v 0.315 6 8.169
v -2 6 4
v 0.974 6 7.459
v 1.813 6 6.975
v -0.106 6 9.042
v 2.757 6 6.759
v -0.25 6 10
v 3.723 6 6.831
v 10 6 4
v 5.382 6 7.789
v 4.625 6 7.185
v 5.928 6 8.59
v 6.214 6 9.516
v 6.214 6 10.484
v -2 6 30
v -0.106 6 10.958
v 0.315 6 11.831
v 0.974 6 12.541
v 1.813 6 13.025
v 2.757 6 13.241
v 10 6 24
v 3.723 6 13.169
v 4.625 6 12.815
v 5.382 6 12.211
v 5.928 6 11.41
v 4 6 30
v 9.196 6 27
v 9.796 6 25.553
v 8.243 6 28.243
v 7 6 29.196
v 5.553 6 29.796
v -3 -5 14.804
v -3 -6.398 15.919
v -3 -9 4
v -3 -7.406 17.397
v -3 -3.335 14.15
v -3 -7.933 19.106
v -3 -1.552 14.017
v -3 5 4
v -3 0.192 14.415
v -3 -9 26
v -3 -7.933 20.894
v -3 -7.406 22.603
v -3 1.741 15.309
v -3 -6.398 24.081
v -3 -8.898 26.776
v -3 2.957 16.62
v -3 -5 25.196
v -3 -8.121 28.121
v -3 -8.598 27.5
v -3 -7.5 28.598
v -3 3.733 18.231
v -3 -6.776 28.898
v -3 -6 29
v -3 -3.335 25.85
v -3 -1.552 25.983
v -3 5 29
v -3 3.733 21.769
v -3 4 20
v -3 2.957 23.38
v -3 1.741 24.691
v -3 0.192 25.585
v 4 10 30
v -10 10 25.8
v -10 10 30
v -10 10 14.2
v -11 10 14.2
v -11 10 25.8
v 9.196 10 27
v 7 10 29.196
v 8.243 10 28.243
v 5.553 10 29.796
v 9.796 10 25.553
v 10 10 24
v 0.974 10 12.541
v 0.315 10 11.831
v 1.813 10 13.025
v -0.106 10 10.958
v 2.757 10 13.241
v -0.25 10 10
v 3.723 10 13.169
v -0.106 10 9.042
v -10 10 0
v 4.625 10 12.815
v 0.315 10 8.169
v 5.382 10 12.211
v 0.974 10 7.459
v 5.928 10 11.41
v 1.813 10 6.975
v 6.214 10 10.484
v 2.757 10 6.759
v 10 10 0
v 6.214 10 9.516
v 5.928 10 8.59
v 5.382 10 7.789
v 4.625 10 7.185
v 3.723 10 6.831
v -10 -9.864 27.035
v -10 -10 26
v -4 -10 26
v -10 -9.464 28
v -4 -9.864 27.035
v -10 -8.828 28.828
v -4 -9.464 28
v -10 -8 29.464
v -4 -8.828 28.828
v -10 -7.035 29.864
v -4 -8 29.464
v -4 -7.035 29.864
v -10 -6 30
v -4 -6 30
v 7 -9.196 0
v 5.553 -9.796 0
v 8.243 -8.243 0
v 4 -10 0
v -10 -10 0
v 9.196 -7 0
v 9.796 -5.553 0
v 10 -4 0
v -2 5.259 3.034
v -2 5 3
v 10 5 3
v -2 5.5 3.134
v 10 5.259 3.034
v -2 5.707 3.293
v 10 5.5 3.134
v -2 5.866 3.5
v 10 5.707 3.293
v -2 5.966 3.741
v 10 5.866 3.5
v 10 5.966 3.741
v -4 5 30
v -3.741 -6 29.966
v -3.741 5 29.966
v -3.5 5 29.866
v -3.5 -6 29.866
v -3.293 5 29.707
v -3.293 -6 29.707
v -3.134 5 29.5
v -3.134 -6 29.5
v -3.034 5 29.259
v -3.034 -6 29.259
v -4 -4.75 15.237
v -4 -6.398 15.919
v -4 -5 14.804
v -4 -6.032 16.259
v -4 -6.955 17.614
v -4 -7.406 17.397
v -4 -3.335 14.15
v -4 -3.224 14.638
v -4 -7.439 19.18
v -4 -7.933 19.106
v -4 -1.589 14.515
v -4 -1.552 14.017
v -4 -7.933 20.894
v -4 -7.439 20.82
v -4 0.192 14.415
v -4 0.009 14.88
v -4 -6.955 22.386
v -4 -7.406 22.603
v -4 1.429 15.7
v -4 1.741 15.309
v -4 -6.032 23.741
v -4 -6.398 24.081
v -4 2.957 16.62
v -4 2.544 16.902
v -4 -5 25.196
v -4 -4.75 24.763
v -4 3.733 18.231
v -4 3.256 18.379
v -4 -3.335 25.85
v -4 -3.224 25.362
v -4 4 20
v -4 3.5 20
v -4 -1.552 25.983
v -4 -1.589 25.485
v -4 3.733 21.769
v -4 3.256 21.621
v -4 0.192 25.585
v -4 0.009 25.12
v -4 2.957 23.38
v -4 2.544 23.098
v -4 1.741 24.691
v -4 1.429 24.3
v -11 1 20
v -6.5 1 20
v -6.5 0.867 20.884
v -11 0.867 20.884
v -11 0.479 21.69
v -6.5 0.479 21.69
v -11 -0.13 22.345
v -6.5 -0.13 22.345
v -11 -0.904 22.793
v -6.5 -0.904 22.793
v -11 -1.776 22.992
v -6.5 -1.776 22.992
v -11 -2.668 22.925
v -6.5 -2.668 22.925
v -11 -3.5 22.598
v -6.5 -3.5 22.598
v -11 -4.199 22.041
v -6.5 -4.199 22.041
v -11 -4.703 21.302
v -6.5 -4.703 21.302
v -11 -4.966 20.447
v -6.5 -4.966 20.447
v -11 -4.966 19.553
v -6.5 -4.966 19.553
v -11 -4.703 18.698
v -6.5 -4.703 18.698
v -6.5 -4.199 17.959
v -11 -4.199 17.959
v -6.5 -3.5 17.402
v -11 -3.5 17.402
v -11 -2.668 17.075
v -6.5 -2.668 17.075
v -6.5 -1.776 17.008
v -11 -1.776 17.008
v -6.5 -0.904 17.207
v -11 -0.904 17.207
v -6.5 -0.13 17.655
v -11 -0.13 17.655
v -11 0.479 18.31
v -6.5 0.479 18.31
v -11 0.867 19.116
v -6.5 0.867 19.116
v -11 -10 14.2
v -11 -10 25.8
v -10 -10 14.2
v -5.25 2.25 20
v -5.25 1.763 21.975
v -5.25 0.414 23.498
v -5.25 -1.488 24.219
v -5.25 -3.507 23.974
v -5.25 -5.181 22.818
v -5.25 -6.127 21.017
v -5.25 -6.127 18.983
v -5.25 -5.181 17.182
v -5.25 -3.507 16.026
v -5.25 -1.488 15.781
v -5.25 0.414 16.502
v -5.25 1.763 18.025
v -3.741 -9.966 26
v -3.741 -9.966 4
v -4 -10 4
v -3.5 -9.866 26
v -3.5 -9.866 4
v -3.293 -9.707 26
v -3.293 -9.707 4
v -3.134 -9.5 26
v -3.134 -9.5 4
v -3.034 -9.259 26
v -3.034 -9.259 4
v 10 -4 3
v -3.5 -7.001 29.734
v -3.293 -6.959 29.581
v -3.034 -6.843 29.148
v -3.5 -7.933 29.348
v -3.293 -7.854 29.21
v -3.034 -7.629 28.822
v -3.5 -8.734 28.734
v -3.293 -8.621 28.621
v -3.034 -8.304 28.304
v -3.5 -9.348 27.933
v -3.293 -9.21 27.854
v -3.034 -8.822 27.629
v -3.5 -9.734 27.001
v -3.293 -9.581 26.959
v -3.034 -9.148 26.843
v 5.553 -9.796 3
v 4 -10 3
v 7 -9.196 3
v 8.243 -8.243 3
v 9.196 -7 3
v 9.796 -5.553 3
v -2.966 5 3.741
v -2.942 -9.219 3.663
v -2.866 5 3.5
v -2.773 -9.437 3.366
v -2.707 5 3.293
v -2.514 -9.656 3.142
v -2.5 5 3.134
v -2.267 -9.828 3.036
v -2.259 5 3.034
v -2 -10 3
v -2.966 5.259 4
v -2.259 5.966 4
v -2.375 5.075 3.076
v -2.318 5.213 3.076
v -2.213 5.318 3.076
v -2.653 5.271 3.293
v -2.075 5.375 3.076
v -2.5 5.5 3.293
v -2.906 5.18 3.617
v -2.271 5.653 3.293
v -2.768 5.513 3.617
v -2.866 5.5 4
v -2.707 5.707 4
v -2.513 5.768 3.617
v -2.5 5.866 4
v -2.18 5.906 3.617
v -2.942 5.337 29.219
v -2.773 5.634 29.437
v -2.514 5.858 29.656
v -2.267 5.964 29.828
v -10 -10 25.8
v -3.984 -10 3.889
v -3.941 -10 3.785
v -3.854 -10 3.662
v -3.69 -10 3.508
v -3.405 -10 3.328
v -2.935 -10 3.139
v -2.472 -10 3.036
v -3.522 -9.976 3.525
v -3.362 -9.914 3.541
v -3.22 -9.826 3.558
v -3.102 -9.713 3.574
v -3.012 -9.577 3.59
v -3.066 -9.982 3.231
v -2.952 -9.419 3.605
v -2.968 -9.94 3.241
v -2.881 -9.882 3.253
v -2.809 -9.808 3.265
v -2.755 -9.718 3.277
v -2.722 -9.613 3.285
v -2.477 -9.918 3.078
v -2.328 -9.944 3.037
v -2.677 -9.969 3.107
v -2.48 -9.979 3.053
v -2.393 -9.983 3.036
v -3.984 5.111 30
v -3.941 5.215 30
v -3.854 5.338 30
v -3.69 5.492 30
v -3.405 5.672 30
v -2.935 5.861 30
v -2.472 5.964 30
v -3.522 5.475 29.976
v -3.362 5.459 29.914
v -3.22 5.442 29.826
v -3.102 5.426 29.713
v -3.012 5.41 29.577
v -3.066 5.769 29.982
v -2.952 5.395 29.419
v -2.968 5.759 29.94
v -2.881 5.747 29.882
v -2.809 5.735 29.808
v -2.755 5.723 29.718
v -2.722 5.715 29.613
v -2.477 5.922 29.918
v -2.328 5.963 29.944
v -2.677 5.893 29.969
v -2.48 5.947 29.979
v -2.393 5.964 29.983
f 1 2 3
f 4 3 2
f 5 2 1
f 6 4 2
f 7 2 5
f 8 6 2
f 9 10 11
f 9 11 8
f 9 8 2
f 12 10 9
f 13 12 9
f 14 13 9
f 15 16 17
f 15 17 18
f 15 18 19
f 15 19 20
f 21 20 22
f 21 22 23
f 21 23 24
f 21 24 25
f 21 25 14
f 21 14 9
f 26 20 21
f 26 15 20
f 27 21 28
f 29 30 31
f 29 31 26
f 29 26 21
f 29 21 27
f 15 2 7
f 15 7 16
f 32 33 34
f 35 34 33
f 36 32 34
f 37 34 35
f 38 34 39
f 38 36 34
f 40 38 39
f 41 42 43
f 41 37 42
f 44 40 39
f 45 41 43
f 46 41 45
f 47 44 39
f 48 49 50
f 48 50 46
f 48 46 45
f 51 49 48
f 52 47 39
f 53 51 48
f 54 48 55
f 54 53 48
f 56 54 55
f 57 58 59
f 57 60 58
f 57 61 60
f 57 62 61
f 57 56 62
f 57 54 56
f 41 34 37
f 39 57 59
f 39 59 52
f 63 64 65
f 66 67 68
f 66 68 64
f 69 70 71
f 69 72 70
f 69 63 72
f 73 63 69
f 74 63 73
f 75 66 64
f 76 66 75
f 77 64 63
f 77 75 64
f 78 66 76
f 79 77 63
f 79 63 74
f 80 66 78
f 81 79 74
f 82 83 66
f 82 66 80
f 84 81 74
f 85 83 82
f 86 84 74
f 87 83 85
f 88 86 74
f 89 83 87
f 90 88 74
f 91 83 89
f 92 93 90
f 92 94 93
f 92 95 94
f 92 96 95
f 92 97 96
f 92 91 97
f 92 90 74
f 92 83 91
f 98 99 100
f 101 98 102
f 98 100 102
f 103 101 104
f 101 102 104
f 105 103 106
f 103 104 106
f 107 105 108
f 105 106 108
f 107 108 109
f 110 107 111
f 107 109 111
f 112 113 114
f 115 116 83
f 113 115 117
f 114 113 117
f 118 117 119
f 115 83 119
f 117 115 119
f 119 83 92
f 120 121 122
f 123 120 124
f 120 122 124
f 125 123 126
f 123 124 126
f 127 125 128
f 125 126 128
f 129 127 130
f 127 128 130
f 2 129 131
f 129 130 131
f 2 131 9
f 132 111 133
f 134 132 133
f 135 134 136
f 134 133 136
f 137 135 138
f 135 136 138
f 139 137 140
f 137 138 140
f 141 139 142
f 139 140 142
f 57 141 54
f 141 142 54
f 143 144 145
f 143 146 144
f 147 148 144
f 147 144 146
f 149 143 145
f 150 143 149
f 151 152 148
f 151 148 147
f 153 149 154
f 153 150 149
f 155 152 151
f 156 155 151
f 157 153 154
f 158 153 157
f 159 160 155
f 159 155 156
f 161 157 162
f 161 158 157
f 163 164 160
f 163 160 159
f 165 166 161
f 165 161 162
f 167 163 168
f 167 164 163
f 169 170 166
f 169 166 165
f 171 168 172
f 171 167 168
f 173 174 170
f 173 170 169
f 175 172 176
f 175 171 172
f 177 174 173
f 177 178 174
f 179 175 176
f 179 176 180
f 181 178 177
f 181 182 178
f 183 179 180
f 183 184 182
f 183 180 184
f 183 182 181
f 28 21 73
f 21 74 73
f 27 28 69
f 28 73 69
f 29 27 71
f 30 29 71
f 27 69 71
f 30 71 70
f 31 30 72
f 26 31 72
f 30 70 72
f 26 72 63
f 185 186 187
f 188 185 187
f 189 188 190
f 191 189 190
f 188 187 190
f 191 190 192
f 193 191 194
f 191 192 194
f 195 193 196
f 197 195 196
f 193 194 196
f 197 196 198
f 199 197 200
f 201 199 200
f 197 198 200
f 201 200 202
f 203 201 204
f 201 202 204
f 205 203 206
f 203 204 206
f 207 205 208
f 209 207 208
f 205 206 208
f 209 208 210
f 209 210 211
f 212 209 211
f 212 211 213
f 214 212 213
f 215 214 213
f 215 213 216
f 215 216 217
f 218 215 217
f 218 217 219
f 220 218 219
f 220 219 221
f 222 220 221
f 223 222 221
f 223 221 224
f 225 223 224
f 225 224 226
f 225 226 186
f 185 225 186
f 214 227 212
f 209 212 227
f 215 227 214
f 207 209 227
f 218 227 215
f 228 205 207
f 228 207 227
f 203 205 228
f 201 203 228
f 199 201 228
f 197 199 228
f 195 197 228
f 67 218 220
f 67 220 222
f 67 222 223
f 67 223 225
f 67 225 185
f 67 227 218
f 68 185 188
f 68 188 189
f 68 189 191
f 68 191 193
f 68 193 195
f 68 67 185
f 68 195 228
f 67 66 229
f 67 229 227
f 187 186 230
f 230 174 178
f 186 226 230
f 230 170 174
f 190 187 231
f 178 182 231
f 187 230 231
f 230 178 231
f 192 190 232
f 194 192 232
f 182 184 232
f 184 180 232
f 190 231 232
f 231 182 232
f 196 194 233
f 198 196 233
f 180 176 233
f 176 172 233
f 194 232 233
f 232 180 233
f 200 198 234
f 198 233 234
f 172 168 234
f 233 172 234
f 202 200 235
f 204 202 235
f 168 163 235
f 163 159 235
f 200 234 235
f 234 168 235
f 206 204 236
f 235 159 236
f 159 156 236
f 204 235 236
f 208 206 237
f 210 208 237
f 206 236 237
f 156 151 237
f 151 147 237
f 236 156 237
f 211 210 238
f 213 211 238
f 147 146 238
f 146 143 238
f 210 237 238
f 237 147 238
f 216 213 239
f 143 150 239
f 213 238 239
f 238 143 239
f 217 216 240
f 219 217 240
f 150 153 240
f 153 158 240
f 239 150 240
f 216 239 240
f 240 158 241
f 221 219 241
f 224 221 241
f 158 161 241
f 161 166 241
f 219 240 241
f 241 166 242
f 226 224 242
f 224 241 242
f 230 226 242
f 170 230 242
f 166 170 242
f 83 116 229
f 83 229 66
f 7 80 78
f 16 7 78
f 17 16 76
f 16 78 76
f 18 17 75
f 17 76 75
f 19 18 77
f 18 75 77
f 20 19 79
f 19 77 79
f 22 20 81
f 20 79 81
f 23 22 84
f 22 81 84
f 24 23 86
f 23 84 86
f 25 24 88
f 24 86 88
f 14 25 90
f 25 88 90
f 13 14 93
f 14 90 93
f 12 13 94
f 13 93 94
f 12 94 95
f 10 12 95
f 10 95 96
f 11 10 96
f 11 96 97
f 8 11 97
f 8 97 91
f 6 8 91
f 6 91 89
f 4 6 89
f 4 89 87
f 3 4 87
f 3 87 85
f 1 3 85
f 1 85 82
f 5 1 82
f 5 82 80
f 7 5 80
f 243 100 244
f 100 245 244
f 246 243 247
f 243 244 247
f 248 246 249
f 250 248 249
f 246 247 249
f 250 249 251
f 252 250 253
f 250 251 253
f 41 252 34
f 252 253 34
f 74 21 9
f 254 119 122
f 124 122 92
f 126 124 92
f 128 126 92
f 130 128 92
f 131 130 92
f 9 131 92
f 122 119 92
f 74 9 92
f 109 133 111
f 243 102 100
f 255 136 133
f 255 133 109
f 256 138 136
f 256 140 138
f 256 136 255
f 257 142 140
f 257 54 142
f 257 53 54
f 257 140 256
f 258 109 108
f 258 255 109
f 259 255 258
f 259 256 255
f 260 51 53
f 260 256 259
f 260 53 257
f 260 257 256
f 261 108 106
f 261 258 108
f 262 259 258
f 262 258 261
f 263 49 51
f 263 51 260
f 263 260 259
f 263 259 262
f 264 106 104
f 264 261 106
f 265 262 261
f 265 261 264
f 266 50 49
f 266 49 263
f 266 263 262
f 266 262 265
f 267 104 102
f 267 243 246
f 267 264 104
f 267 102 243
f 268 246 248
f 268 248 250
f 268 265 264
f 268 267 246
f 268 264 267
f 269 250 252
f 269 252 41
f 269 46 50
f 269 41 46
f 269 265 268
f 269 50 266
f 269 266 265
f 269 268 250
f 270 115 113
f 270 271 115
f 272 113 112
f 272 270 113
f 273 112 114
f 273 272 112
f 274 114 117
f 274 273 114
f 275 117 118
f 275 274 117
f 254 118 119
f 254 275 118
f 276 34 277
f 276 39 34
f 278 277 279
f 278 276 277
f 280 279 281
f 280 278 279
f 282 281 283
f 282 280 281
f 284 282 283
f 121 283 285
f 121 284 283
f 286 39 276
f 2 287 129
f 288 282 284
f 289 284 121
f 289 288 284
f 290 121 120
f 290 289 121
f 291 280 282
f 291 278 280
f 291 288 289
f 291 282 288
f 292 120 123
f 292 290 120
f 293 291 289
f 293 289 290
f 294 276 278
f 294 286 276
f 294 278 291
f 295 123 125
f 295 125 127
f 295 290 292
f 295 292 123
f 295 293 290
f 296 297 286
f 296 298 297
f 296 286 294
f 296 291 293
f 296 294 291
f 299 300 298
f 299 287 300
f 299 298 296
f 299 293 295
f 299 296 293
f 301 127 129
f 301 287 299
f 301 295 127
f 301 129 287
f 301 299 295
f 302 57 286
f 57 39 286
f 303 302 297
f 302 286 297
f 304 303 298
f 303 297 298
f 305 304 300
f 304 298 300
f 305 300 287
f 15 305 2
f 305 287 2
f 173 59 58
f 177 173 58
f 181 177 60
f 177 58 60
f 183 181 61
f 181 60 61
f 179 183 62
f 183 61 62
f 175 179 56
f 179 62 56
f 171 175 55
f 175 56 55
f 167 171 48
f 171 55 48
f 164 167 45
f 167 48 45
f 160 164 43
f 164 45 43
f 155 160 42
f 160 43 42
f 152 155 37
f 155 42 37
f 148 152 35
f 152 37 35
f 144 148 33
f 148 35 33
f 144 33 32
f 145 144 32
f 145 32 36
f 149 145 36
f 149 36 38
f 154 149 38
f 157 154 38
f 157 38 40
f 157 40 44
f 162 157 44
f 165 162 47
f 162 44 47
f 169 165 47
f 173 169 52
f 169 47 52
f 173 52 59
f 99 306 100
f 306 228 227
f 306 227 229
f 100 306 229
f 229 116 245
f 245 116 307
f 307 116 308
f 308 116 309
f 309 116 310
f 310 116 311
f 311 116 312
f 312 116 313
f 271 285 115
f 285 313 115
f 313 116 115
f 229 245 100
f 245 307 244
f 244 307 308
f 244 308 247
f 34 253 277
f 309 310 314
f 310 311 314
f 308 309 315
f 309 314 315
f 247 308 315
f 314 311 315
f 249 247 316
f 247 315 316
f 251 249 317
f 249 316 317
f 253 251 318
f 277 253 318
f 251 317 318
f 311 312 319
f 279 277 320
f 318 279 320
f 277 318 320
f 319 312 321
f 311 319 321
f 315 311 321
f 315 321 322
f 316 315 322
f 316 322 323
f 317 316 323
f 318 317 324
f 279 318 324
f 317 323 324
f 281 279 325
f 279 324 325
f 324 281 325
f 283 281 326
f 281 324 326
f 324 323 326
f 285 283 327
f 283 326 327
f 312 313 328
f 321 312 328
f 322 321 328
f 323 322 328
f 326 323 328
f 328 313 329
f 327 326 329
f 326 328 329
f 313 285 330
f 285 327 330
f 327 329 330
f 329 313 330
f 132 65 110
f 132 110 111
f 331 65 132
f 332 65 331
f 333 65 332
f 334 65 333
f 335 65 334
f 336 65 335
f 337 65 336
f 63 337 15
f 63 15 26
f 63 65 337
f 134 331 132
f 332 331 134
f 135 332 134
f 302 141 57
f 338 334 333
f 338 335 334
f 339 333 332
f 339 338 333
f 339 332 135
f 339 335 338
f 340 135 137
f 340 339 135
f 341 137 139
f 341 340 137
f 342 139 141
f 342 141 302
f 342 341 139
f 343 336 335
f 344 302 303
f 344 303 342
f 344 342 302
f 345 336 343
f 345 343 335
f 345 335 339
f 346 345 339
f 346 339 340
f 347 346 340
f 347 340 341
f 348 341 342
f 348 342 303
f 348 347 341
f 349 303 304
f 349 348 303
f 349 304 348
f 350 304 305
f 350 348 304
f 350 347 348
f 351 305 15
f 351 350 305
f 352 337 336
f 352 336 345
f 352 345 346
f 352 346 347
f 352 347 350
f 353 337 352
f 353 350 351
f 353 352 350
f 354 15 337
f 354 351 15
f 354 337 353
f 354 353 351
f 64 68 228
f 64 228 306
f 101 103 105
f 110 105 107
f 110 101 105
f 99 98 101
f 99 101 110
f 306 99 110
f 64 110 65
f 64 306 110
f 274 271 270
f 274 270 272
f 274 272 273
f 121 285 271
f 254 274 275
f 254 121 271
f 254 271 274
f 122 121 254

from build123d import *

# Parameters (mm, degrees)
SKETCH_W        = 20
SKETCH_H        = 20
PAD_DEPTH       = 30
PAD001_DEPTH    = 20
SKETCH002_W     = 13
SKETCH002_H     = 16
POCKET_DEPTH    = 27
SKETCH003_R     = 3
POCKET001_DEPTH = 8.001
SKETCH004_R     = 6
POCKET002_DEPTH = 1
CHAMFER_SIZE    = 2.5
FILLET_R        = 4
FILLET001_R     = 1
FILLET002_R     = 6
SKETCH005_R     = 3.25
POCKET003_DEPTH = 5


with BuildPart() as part:
    # Sketch → Pad (new body)
    with BuildSketch(Plane.XY):
        Rectangle(SKETCH_W, SKETCH_H)
    extrude(amount=PAD_DEPTH)

    # Sketch001 (on Face1 of Pad) → Pad001 (join)
    with BuildSketch(Plane(origin=(0, 10, 0), x_dir=(-1, 0, 0), z_dir=(0, 1, 0))):
        Polygon((10, 25.8), (10, 20), (10, 14.2), (11, 14.2), (11, 25.8), align=None)
    extrude(amount=-PAD001_DEPTH)

    # Sketch002 (on Face7 of Pad001) → Pocket (cut)
    with BuildSketch(Plane.XY.offset(30)):
        with Locations((3.5, -2)):
            Rectangle(SKETCH002_W, SKETCH002_H)
    extrude(amount=-POCKET_DEPTH, mode=Mode.SUBTRACT)

    # Sketch003 (on Face12 of Pocket) → Pocket001 (cut, through all)
    with BuildSketch(Plane.YZ.offset(-3)):
        with Locations((-2, 20)):
            Circle(SKETCH003_R)
    extrude(amount=-POCKET001_DEPTH, mode=Mode.SUBTRACT)

    # Sketch004 (on Face12 of Pocket001) → Pocket002 (cut)
    with BuildSketch(Plane.YZ.offset(-3)):
        with Locations((-2, 20)):
            Circle(SKETCH004_R)
    extrude(amount=-POCKET002_DEPTH, mode=Mode.SUBTRACT)

    # Chamfer
    chamfer_edges = [part.edges().sort_by_distance(p)[0] for p in [
        (-4, -5, 20),
    ]]
    chamfer(chamfer_edges, length=CHAMFER_SIZE)

    # Fillet
    fillet_edges = [part.edges().sort_by_distance(p)[0] for p in [
        (-6.5, -10, 30),
    ]]
    fillet(fillet_edges, radius=FILLET_R)

    # Fillet001
    fillet001_edges = [part.edges().sort_by_distance(p)[0] for p in [
        (-3, -10, 14.5),
        (-3, 6, 16.5),
        (-3, -2, 3),
        (3.5, 6, 3),
    ]]
    fillet(fillet001_edges, radius=FILLET001_R)

    # Fillet002
    fillet002_edges = [part.edges().sort_by_distance(p)[0] for p in [
        (10, -10, 1.5),
        (10, 8, 30),
    ]]
    fillet(fillet002_edges, radius=FILLET002_R)

    # Sketch005 (on Face2 of Fillet002) → Pocket003 (cut)
    with BuildSketch(Plane(origin=(0, 10, 0), x_dir=(-1, 0, 0), z_dir=(0, 1, 0))):
        with Locations((-3, 10)):
            Circle(SKETCH005_R)
    extrude(amount=-POCKET003_DEPTH, mode=Mode.SUBTRACT)


solid = part.part
